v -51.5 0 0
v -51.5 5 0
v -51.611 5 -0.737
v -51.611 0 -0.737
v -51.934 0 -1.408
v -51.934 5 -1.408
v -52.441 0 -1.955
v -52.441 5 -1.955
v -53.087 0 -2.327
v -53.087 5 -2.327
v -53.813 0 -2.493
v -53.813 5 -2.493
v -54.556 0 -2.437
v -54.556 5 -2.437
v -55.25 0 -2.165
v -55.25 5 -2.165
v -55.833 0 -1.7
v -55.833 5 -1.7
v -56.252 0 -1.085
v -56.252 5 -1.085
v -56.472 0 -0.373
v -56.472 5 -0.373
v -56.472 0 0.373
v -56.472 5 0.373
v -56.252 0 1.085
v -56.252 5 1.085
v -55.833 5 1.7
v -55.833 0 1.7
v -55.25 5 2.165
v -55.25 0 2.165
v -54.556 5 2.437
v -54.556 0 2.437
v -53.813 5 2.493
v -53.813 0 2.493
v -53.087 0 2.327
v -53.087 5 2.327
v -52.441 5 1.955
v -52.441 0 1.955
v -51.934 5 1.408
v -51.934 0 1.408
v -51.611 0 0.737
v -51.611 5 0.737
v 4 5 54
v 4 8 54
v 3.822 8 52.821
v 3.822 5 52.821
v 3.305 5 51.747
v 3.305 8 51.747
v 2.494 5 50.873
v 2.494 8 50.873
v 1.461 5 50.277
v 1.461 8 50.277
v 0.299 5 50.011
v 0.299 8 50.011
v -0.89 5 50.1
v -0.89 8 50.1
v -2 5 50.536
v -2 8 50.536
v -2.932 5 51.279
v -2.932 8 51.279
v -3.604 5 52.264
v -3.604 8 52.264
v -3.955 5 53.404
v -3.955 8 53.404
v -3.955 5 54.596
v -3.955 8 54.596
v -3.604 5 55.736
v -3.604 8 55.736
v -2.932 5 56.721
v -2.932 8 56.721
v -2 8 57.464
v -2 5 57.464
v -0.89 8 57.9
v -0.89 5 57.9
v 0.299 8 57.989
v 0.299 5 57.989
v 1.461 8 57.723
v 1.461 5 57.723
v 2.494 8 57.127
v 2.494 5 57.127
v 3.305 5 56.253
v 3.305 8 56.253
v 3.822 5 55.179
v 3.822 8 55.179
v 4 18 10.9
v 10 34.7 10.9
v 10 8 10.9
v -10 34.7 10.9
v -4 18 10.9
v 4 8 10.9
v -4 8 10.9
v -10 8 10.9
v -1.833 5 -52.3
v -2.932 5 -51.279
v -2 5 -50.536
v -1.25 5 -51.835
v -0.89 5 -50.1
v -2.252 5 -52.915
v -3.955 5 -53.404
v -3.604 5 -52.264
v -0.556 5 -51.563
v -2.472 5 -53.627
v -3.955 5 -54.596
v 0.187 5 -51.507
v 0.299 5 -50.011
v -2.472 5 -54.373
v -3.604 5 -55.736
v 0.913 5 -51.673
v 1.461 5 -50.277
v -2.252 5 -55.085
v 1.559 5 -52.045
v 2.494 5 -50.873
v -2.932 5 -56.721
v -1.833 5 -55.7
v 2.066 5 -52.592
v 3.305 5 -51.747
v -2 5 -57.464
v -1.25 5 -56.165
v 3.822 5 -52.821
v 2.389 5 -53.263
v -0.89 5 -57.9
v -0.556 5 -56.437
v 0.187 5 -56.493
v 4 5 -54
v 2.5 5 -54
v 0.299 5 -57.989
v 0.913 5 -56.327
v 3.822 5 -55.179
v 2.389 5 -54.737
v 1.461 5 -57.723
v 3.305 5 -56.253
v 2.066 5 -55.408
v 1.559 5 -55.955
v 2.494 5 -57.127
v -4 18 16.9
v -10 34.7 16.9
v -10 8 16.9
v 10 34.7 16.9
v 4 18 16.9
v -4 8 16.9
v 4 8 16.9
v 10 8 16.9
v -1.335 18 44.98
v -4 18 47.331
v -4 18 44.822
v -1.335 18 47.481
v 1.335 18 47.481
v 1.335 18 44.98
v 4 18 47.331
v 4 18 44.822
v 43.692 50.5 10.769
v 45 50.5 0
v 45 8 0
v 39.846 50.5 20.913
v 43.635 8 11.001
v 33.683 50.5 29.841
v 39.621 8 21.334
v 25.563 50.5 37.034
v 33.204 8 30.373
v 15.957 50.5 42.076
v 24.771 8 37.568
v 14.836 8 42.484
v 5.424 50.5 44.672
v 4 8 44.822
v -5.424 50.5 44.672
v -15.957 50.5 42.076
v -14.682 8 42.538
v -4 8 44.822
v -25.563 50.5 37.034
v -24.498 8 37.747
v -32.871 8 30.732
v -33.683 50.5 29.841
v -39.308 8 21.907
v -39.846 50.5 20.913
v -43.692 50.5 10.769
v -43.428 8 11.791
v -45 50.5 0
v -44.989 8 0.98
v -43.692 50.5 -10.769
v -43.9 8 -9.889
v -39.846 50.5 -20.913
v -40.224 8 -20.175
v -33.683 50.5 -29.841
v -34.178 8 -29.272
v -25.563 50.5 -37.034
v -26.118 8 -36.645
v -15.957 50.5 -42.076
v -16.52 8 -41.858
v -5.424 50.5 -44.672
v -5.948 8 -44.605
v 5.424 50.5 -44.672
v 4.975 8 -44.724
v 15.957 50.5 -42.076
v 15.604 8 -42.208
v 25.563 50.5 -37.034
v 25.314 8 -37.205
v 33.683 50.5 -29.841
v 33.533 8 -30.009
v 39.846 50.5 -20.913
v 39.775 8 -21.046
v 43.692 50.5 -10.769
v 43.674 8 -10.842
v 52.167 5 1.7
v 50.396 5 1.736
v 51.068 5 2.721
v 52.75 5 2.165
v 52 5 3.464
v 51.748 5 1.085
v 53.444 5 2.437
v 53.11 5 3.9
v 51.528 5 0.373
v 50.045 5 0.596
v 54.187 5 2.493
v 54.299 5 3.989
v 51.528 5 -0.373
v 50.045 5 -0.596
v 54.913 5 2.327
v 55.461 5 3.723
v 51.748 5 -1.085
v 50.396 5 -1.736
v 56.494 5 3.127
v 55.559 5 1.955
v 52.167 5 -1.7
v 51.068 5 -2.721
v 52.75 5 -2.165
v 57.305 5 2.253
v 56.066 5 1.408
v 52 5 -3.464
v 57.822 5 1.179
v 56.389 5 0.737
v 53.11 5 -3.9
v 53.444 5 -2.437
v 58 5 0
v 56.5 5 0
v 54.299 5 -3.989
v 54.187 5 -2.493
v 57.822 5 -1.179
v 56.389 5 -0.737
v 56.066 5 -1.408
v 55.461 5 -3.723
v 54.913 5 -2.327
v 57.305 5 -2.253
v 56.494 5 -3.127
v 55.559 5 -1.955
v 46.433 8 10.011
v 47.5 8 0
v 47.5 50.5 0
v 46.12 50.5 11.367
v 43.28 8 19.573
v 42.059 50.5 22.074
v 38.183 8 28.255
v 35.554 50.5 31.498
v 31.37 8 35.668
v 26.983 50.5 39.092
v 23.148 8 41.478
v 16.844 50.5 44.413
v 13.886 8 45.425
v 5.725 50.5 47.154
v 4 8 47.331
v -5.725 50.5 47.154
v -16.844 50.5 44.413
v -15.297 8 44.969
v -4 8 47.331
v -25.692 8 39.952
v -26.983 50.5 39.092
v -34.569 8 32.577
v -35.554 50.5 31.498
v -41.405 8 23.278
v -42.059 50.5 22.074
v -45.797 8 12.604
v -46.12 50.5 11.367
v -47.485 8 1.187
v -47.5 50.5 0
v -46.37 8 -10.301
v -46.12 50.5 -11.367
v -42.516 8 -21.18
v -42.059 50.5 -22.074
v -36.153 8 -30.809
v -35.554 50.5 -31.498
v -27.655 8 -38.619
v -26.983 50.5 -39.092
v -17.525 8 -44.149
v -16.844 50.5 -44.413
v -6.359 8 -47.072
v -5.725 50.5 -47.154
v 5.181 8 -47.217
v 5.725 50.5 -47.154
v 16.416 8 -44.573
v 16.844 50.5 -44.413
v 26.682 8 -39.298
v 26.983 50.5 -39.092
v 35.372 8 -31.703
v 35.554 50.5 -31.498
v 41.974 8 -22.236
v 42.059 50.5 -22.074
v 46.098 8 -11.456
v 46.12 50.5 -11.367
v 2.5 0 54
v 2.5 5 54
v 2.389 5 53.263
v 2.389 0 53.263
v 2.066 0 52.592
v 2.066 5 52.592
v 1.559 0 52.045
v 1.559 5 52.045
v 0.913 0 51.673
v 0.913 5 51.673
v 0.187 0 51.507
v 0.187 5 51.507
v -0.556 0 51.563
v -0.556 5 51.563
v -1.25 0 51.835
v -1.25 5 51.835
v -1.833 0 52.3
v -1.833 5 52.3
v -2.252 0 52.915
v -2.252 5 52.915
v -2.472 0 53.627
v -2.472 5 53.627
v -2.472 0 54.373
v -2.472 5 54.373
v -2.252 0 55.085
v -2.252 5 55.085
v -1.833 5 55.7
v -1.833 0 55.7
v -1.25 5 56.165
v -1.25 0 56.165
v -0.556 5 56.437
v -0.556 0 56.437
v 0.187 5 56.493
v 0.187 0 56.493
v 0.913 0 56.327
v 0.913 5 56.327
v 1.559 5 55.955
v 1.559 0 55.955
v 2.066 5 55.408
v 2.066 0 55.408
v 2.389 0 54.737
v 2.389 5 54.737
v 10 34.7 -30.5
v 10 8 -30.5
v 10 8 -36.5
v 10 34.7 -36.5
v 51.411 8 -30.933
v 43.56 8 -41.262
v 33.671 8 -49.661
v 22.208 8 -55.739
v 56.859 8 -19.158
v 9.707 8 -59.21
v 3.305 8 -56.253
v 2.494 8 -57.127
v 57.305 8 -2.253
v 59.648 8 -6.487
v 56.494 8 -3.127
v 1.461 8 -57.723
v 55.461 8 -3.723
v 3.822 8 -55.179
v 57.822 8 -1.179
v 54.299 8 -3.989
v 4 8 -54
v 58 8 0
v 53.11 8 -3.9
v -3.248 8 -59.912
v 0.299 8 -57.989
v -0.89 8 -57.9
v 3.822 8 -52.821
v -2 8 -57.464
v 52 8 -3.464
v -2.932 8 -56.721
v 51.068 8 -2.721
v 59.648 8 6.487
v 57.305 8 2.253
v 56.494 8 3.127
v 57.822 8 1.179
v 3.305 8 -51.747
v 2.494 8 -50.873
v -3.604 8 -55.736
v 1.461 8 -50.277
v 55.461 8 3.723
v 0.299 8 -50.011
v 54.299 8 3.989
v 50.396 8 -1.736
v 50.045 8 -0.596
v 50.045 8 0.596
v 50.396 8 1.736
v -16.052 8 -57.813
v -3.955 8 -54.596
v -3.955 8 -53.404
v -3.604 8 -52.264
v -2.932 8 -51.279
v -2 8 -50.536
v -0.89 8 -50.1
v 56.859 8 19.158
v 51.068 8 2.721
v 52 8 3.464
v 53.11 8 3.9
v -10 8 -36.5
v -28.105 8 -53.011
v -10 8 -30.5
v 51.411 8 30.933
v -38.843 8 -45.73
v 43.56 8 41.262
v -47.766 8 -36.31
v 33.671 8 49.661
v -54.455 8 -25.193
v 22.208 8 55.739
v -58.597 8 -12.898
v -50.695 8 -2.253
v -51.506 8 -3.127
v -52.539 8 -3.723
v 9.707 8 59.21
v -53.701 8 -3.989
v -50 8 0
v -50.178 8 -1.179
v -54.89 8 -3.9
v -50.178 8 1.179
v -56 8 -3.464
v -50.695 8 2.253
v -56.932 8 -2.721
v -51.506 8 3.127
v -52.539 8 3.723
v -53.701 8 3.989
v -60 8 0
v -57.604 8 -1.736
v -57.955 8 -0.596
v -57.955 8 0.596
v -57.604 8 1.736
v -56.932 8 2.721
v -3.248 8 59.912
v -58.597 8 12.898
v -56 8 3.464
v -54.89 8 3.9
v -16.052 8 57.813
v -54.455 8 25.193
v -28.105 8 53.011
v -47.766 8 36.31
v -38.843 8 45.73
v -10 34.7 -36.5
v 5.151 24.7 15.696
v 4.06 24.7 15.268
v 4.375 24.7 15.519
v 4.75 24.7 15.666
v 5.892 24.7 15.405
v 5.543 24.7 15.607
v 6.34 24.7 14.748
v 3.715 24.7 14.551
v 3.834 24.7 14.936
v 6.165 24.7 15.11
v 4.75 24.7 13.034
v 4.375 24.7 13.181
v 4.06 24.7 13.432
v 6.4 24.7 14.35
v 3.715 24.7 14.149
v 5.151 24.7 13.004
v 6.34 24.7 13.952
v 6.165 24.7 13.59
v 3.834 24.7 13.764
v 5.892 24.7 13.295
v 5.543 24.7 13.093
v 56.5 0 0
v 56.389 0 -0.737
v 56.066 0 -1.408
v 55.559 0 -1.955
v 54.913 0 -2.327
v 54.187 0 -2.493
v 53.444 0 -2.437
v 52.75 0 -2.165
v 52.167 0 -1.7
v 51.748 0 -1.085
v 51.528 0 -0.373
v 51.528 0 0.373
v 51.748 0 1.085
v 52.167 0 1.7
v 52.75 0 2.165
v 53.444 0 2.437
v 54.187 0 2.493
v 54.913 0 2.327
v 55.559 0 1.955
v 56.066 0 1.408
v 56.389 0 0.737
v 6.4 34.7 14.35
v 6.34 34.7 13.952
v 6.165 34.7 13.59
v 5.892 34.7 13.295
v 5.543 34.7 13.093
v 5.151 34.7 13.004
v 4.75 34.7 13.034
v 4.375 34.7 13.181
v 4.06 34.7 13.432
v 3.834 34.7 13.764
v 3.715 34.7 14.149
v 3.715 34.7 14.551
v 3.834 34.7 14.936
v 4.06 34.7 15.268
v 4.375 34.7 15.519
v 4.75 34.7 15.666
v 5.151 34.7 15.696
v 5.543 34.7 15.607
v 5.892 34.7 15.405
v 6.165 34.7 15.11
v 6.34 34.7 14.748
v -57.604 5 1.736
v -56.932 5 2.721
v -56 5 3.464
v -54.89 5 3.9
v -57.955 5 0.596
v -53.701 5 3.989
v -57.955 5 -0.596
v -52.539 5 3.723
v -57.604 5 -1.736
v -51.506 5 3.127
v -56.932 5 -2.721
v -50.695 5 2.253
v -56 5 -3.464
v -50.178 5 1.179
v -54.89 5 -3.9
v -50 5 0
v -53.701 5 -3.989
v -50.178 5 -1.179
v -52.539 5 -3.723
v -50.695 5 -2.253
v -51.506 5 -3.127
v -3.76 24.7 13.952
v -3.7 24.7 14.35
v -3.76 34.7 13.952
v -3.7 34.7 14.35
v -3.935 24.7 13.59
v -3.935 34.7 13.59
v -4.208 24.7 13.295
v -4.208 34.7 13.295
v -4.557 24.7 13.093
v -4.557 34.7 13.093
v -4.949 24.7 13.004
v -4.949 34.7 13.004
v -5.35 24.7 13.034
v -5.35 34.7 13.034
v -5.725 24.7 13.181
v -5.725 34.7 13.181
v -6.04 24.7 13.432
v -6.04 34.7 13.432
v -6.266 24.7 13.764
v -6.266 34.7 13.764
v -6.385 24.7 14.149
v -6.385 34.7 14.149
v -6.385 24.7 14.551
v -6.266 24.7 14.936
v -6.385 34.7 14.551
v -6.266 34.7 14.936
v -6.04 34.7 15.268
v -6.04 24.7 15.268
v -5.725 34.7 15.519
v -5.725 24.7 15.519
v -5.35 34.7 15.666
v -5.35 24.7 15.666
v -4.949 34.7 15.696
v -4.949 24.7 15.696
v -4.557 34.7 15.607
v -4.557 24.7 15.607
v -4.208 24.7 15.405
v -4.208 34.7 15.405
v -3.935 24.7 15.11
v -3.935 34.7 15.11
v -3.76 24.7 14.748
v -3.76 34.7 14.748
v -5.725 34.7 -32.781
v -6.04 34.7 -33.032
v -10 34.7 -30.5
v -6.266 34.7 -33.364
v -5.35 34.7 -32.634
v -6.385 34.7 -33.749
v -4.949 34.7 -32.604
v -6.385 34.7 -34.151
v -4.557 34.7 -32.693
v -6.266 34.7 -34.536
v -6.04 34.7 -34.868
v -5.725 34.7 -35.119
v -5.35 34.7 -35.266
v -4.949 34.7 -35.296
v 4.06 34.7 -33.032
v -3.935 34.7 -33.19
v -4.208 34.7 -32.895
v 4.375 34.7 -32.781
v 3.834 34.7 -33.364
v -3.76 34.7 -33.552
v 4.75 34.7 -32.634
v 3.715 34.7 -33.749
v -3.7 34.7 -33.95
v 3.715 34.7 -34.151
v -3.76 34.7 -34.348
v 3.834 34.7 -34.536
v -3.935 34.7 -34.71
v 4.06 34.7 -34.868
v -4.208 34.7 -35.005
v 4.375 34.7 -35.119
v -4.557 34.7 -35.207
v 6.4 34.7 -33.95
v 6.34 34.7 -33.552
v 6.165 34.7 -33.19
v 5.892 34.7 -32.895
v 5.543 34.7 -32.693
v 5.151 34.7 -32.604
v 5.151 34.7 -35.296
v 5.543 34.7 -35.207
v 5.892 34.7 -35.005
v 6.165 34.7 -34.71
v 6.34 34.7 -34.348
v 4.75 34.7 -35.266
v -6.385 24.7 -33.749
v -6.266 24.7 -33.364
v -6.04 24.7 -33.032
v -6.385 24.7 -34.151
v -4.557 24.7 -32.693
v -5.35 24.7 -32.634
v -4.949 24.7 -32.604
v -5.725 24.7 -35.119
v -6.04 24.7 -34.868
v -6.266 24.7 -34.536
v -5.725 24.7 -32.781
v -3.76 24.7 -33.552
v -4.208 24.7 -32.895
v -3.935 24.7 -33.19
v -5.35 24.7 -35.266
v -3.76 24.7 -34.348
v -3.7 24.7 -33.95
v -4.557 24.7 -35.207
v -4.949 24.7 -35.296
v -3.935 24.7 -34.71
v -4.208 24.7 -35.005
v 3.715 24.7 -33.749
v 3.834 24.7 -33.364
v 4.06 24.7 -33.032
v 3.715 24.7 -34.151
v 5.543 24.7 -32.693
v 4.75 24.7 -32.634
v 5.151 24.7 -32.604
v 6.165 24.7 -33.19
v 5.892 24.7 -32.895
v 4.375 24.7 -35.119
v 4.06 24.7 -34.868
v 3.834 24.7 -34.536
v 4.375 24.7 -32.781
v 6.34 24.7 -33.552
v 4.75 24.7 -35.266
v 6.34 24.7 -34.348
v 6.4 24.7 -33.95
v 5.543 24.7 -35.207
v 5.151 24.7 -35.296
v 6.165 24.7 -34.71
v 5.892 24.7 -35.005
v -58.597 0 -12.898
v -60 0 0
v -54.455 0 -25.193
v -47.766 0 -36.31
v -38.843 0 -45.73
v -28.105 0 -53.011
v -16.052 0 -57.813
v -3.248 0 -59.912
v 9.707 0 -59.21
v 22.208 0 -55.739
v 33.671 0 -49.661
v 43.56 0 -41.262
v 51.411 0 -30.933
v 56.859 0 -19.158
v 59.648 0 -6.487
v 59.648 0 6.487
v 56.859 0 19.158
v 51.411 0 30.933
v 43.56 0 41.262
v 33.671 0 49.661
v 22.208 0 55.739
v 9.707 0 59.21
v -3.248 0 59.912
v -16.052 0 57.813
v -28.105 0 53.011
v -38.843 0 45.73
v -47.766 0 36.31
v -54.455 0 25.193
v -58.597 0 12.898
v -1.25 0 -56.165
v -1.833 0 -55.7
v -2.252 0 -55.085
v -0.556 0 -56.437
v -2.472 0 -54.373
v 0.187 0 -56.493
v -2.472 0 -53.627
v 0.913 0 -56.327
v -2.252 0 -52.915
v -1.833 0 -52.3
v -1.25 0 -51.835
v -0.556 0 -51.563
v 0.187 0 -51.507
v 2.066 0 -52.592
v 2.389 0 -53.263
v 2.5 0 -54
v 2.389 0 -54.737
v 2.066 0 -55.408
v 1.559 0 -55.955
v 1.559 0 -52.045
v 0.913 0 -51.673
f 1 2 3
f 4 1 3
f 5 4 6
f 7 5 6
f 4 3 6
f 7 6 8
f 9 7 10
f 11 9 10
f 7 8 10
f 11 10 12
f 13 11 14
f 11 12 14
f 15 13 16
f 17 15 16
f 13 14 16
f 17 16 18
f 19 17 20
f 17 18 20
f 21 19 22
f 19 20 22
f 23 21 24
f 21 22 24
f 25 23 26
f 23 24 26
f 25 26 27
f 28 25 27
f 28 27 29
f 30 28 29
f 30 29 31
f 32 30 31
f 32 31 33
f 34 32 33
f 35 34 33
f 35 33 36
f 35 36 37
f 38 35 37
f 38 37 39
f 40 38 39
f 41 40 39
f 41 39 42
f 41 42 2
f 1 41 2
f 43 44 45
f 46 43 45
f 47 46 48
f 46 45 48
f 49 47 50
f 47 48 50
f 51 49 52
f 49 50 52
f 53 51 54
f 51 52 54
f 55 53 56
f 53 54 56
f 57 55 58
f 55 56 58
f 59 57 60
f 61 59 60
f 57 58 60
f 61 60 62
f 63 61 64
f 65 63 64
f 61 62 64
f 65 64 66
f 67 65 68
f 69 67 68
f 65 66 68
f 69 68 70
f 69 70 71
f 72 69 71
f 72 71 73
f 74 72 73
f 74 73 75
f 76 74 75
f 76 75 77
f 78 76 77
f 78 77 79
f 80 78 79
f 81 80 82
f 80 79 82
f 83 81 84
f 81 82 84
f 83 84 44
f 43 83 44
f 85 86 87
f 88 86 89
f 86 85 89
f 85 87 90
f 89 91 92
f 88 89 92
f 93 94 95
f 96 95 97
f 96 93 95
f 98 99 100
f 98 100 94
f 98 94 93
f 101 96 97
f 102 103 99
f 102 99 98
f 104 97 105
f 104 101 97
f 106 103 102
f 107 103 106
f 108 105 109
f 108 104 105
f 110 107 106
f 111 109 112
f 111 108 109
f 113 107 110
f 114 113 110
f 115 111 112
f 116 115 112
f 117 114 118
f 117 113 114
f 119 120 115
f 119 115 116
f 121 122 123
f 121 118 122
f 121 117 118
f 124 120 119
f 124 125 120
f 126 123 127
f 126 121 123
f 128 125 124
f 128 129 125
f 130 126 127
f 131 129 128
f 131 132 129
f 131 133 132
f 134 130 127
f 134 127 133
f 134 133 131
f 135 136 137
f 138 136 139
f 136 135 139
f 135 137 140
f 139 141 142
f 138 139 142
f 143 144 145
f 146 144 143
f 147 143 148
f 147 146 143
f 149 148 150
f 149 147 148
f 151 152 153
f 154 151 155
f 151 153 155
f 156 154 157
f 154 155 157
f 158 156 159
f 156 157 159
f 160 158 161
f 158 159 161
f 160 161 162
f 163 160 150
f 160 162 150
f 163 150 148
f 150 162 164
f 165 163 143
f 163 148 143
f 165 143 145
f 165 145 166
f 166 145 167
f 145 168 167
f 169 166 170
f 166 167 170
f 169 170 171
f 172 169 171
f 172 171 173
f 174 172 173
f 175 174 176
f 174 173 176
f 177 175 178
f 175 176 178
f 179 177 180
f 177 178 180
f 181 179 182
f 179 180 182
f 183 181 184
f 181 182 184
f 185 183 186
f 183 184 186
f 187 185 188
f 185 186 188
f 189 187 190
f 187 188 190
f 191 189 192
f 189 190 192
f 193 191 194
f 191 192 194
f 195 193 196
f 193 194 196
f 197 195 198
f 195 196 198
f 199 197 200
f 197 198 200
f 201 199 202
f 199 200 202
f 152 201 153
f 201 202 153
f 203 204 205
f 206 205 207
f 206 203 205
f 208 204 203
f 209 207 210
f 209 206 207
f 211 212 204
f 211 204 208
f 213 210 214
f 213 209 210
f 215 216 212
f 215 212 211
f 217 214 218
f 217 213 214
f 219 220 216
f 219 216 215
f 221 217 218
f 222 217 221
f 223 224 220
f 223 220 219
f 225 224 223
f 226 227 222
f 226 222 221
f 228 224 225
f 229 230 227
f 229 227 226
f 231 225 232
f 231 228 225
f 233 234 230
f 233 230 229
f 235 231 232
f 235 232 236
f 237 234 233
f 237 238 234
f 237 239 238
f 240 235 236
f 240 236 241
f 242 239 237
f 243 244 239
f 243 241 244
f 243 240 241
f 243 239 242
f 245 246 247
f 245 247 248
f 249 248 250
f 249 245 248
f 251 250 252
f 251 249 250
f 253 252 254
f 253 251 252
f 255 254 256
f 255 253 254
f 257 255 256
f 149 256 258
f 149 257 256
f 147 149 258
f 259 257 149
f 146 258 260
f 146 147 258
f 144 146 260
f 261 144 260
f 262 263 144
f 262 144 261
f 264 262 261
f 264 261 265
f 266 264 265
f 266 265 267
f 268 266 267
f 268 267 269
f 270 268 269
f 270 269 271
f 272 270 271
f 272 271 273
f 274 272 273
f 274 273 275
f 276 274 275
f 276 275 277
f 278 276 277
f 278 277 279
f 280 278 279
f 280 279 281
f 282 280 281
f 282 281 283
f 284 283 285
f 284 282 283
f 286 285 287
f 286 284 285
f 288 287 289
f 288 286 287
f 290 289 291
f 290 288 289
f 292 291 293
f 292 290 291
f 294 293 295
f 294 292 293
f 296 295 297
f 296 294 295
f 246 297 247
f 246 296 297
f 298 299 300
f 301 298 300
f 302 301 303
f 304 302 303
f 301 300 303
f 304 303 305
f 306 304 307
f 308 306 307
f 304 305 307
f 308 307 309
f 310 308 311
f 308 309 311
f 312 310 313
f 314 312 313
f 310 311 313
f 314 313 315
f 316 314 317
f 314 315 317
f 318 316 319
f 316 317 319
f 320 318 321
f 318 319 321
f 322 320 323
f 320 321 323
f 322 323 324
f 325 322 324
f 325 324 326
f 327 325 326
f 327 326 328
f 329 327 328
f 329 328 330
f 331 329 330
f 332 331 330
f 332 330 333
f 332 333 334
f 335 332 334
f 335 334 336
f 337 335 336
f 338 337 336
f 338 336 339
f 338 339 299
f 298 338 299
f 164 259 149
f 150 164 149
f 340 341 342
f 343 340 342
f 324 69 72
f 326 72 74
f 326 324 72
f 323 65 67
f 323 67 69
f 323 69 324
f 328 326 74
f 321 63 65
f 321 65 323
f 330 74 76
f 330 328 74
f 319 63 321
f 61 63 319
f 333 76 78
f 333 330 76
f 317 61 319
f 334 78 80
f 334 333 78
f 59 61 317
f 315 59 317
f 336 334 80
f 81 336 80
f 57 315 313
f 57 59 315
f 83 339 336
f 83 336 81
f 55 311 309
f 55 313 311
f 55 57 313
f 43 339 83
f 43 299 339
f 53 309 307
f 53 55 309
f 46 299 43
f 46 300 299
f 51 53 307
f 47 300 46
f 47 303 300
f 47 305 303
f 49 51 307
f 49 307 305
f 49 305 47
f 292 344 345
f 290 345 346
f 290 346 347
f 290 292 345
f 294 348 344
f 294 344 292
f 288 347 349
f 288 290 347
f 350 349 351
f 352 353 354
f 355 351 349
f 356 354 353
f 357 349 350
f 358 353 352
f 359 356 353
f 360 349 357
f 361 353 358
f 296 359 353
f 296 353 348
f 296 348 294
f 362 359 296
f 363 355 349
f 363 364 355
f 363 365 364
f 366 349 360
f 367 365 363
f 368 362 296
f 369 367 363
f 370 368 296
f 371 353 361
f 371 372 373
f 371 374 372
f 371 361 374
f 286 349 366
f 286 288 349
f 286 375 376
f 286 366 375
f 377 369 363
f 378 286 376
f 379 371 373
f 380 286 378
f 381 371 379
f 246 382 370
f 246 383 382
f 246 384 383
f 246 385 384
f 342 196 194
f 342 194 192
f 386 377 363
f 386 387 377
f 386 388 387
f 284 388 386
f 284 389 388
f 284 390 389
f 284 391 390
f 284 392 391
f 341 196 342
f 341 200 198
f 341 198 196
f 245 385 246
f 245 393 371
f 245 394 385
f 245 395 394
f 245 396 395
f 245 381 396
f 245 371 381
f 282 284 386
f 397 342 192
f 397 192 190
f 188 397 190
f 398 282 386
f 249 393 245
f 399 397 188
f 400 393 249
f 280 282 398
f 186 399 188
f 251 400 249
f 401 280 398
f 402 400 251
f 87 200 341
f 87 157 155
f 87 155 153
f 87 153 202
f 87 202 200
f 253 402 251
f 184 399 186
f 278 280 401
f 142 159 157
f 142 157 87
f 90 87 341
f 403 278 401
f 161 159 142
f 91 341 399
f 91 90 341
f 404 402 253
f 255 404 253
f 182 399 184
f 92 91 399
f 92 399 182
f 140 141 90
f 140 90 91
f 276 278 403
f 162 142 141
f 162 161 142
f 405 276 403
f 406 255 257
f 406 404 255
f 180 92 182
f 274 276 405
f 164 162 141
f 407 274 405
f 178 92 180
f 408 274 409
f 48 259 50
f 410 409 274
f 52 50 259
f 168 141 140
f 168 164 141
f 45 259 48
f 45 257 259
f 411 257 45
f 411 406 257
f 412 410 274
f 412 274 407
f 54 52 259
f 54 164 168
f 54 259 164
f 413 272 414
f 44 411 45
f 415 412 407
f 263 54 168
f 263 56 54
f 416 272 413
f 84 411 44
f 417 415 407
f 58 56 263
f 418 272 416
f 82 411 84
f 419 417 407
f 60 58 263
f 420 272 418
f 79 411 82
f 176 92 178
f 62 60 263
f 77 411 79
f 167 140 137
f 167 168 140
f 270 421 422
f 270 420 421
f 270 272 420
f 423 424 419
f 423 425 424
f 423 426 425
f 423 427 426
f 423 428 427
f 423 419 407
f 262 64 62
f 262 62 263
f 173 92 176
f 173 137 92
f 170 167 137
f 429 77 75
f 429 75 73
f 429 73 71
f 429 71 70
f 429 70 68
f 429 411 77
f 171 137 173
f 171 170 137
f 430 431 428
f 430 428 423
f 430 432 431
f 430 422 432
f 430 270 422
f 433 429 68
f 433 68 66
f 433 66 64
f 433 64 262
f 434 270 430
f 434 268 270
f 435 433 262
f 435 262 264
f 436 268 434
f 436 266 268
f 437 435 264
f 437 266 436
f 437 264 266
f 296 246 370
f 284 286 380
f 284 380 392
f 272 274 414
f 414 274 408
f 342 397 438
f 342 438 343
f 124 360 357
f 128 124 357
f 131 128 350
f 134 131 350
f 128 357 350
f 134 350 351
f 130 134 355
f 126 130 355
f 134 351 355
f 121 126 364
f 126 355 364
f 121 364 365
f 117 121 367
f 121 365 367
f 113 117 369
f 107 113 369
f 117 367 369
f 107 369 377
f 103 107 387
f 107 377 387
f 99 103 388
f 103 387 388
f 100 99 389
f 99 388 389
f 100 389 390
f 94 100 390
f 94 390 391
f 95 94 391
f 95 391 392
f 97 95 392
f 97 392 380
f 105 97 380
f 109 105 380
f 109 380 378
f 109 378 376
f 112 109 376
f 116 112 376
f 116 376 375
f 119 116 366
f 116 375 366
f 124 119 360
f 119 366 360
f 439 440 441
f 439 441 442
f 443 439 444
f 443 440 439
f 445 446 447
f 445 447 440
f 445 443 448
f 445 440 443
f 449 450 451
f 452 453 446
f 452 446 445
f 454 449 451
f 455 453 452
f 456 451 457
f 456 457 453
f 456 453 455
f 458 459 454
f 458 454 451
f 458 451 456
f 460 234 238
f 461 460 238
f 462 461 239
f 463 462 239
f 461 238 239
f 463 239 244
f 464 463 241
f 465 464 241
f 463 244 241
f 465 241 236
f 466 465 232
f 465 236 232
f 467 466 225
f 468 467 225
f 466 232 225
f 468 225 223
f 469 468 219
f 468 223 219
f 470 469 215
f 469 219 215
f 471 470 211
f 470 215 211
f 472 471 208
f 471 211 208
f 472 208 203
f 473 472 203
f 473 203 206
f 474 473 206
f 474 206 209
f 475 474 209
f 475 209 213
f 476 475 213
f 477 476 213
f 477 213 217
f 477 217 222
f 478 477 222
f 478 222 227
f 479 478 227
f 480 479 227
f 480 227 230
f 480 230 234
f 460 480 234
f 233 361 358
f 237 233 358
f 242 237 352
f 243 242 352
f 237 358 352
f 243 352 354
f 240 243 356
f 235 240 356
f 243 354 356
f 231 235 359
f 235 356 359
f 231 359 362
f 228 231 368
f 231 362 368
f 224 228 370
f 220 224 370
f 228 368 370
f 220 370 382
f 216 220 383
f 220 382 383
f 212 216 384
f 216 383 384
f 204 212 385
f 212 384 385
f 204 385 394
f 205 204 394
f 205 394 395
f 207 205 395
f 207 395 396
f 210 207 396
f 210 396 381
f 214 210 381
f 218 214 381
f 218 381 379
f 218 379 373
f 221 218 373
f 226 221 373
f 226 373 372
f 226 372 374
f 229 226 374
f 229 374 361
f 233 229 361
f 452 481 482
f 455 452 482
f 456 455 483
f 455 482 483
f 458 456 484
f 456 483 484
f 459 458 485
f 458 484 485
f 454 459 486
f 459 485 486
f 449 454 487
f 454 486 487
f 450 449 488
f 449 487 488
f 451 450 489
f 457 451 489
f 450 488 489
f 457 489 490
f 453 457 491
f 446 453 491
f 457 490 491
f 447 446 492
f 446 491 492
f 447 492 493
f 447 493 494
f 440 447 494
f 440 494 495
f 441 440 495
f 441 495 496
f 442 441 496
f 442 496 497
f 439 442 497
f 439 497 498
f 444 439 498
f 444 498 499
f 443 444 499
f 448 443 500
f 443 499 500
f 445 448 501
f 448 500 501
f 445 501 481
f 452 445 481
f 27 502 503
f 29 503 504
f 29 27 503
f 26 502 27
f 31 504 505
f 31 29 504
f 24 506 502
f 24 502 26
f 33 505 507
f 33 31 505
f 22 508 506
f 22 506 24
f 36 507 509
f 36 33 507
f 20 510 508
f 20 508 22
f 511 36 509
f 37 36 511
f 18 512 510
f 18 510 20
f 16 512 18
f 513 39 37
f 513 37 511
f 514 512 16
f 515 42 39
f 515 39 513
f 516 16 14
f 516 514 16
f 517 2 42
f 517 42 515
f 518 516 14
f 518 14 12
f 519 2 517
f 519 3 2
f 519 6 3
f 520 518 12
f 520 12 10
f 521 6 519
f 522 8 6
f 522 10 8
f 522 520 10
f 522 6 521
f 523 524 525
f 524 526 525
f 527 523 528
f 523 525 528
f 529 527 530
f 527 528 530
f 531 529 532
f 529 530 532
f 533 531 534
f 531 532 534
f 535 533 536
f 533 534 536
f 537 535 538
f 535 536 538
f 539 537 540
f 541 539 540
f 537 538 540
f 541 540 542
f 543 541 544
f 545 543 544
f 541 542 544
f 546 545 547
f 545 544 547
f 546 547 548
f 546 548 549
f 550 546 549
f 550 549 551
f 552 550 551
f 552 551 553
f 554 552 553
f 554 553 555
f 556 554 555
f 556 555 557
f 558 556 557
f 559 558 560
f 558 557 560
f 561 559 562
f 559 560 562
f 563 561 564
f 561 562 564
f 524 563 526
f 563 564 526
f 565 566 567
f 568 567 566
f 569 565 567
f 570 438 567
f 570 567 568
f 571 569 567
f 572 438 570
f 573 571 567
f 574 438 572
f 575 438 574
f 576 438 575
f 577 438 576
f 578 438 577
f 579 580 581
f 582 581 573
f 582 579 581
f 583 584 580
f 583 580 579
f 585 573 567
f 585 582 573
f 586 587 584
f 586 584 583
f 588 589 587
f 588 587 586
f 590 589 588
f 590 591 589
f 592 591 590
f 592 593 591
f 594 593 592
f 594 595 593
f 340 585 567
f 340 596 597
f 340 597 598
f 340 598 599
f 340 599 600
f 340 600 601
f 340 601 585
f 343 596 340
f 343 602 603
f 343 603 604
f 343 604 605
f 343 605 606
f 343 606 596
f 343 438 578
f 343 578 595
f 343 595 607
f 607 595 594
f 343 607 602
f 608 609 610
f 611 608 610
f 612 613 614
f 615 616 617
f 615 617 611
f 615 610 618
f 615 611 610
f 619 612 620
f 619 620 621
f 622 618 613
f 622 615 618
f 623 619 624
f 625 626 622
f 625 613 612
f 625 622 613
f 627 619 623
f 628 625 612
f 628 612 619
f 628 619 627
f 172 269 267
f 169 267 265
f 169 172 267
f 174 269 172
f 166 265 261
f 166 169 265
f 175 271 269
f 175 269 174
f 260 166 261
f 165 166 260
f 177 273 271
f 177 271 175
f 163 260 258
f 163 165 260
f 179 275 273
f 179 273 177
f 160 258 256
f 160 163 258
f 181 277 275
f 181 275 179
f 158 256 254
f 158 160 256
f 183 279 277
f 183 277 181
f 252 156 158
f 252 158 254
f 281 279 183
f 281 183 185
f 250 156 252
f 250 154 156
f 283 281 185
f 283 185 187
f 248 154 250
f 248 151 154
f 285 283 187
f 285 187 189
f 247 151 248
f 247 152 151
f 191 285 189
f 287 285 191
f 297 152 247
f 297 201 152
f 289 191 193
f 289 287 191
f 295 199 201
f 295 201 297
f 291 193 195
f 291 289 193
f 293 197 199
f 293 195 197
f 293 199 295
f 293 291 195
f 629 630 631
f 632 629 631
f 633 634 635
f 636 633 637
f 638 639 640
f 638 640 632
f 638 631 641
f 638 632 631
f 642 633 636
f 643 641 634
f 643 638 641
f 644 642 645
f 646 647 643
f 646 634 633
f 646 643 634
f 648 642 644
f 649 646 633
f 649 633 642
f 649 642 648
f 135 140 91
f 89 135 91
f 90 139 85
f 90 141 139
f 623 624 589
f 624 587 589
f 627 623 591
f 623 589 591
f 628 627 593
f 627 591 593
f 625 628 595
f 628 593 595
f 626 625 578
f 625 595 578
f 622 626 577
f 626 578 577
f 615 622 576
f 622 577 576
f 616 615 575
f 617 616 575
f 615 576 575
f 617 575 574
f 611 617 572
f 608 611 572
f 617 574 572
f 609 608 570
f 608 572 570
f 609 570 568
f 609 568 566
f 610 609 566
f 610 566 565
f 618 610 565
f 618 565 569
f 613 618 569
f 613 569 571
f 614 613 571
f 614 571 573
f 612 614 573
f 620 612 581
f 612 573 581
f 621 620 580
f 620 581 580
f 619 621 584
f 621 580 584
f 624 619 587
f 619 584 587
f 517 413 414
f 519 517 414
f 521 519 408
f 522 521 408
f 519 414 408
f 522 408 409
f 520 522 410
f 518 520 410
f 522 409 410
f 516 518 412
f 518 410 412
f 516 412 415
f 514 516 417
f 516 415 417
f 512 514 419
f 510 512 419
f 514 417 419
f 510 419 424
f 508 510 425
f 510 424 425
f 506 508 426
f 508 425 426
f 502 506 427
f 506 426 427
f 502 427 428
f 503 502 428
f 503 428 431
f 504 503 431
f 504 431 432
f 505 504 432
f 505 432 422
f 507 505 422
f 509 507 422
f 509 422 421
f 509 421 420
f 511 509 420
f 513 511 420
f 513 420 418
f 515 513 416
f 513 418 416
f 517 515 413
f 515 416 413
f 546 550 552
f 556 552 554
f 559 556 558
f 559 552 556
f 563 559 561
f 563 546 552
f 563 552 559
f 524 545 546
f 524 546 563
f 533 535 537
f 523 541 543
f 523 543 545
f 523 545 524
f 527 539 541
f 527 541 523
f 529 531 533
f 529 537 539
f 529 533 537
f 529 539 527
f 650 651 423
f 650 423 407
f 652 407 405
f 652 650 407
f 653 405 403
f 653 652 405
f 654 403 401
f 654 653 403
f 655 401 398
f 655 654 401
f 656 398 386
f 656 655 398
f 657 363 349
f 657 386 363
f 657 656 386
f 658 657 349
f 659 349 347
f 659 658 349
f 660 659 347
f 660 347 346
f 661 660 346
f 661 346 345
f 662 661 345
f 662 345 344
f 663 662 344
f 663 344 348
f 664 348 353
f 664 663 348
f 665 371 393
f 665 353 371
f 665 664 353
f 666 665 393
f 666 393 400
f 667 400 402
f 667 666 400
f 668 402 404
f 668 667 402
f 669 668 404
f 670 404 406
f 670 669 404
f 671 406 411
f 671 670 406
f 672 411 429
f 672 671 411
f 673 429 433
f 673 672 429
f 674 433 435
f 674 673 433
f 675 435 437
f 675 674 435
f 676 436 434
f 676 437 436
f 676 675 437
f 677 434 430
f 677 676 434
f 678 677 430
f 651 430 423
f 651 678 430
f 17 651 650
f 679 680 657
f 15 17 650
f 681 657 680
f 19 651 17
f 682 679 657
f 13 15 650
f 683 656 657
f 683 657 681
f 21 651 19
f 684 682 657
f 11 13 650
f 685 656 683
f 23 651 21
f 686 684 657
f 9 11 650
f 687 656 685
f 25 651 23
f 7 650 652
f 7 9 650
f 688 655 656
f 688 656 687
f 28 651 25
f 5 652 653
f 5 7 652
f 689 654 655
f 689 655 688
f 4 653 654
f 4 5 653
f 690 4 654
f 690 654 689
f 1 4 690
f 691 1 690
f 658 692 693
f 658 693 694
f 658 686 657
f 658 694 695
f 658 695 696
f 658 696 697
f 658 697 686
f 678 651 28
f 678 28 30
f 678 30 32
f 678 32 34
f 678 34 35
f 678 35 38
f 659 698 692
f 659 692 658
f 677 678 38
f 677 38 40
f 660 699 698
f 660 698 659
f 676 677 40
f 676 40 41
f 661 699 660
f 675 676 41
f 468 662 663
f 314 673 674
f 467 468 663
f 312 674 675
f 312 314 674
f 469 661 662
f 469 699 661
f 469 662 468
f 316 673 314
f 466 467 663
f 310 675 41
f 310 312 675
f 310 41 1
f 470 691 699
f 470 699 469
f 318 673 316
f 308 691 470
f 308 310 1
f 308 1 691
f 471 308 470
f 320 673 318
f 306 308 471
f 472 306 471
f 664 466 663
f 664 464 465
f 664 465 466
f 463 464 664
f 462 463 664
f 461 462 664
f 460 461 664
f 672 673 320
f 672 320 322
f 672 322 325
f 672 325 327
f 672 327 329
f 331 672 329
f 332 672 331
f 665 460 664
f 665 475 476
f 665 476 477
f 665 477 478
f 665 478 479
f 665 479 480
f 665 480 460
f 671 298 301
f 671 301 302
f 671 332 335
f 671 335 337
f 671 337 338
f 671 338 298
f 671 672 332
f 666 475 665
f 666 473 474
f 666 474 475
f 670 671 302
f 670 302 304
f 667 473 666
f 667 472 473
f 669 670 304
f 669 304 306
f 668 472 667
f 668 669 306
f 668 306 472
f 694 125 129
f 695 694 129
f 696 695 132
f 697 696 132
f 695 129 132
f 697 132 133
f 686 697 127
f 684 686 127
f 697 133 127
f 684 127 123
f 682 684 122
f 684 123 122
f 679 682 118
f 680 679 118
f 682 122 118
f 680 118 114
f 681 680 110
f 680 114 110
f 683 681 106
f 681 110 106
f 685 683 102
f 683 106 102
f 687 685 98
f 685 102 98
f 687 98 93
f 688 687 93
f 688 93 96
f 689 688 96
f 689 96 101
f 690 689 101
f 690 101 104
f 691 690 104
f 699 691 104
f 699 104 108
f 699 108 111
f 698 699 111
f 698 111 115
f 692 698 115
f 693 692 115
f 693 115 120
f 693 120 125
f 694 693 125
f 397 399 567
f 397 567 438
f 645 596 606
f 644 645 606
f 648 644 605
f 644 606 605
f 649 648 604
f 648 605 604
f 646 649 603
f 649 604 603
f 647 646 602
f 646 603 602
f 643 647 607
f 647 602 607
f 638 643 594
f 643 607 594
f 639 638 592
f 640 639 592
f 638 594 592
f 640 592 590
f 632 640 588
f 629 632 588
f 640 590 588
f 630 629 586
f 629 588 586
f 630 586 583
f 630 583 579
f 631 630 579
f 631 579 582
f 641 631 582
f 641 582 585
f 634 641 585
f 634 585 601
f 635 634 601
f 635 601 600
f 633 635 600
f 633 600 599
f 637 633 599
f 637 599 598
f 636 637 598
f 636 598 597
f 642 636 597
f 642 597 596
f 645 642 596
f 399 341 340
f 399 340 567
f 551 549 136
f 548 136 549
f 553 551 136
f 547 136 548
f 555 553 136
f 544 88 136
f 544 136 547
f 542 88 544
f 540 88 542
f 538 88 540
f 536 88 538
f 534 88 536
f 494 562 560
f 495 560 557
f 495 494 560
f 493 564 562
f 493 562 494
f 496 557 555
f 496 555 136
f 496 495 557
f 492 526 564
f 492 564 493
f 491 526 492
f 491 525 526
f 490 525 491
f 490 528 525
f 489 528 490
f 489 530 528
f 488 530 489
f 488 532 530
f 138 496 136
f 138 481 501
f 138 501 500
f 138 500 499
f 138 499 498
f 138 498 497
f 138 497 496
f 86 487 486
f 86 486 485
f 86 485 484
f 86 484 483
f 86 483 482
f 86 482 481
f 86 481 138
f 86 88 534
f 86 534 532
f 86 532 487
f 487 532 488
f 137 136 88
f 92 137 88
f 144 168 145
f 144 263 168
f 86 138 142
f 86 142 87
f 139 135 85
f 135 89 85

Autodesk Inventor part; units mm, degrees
ref_plane "YZ Plane" through (0, 0, 0) normal (1, 0, 0) x (0, 1, 0)
ref_plane "XZ Plane" through (0, 0, 0) normal (0, 1, 0) x (-1, 0, 0)
ref_plane "XY Plane" through (0, 0, 0) normal (0, 0, 1) x (1, 0, 0)
sketch "Sketch1" plane through (0, 0, 0) normal (0, 1, 0) x (-1, 0, 0)
  circle A0 centre (0, 0) radius 60
  dimension "d0" = 120
extrude "Extrusion1" add sketch "Sketch1" along normal blind 8
sketch "Sketch2" plane through (0, 8, 0) normal (0, 1, 0) x (1, 0, 0)
  circle A0 centre (-54, 0) radius 4
  circle A1 centre (-54, 0) radius 2.5
  circle A2 centre (0, -54) radius 4
  circle A3 centre (0, -54) radius 2.5
  circle A4 centre (54, 0) radius 4
  circle A5 centre (54, 0) radius 2.5
  circle A6 centre (0, 54) radius 4
  circle A7 centre (0, 54) radius 2.5
  point P0 (0, 0)
  dimension "d3" = 8
  dimension "d4" = 5
  dimension "d5" = 8
  dimension "d6" = 5
  dimension "d7" = 8
  dimension "d8" = 5
  dimension "d9" = 8
  dimension "d10" = 5
extrude "Extrusion2" cut sketch "Sketch2" against normal blind 8 contours A1 | A3 | A5 | A7
sketch "Sketch3" plane through (0, 8, 0) normal (0, 1, 0) x (1, 0, 0)
  circle A0 centre (-54, 0) radius 2.5 projected
  circle A1 centre (-54, 0) radius 4
  circle A2 centre (-54, 0) radius 2.5
  circle A3 centre (0, 54) radius 2.5 projected
  circle A4 centre (0, 54) radius 4
  circle A5 centre (0, 54) radius 2.5
  circle A6 centre (54, 0) radius 2.5 projected
  circle A7 centre (54, 0) radius 4
  circle A8 centre (54, 0) radius 2.5
  circle A9 centre (0, -54) radius 4
  circle A10 centre (0, -54) radius 2.5
  point P0 (0, 0)
  dimension "d13" = 8
  dimension "d14" = 8
  dimension "d15" = 5
  dimension "d16" = 8
  dimension "d17" = 5
  dimension "d18" = 8
extrude "Extrusion3" cut sketch "Sketch3" against normal blind 3
sketch "Sketch4" plane through (0, 8, 0) normal (0, 1, 0) x (1, 0, 0)
  circle A0 centre (0, 0) radius 47.5
  circle A1 centre (0, 0) radius 45
  line L0 (0, 0) -> (-10, 0)
  line L1 (-10, 0) -> (-10, -9)
  line L2 (-10, -9) -> (0, -9)
  line L3 (0, -9) -> (0, 0)
  line L4 (0, -9) -> (10, -9)
  line L5 (10, -9) -> (10, 0)
  line L6 (10, 0) -> (0, 0)
  line L7 (0, 0) -> (0, -9)
  line L8 (-10, -9) -> (10, -9)
  line L9 (10, -9) -> (10, -16)
  line L10 (10, -16) -> (-10, -16)
  line L11 (-10, -16) -> (-10, -9)
  dimension "d21" = 95
  dimension "d22" = 90
  dimension "d23" = 10
  dimension "d24" = 9
  dimension "d25" = 10
  dimension "d26" = 7
extrude "Extrusion4" add sketch "Sketch4" along normal blind 10 contours A0
sketch "Sketch5" plane through (0, 8, 0) normal (0, 1, 0) x (1, 0, 0)
  line L0 (0, 0) -> (-10, 0)
  line L1 (-10, 0) -> (-10, -9)
  line L2 (-10, -9) -> (0, -9)
  line L3 (0, -9) -> (0, 0)
  line L4 (-10, -9) -> (10, -9)
  line L5 (10, -9) -> (10, -16)
  line L6 (10, -16) -> (-10, -16)
  line L7 (-10, -16) -> (-10, -9)
  line L8 (-10, -9) -> (10, -9)
  line L9 (10, -9) -> (10, 31)
  line L10 (10, 31) -> (-10, 31)
  line L11 (-10, 31) -> (-10, -9)
  line L12 (-10, 31) -> (-2, 31)
  line L13 (-2, 31) -> (-2, 38.36)
  line L14 (-2, 38.36) -> (-10, 38.36)
  line L15 (-10, 38.36) -> (-10, 31)
  line L16 (-10, 31) -> (10, 31)
  line L17 (10, 31) -> (10, 39)
  line L18 (10, 39) -> (-10, 39)
  line L19 (-10, 39) -> (-10, 31)
  line L20 (-10, -9) -> (10, -9)
  line L21 (10, -9) -> (10, -17)
  line L22 (10, -17) -> (-10, -17)
  line L23 (-10, -17) -> (-10, -9)
  dimension "d29" = 10
  dimension "d30" = 9
  dimension "d31" = 20
  dimension "d32" = 7
  dimension "d33" = 40
  dimension "d34" = 8
  dimension "d35" = 8
  dimension "d36" = 8
extrude "Extrusion5" add sketch "Sketch5" along normal blind 28 contours L4 L5 L6 L7 L2 | L15 L14 L13 L10 | L6 L21 L22 L23 | L13 L14 L19 L18 L17 L10
sketch "Sketch6" plane through (0, 36, 0) normal (0, 1, 0) x (1, 0, 0)
  line L0 (10, -17) -> (-10, -17) projected
  line L1 (-10, -9) -> (10, -9) projected
  line L2 (0, -17) -> (-4, -17)
  line L3 (-4, -17) -> (-4, -9)
  line L4 (-4, -9) -> (0, -9)
  line L5 (0, -9) -> (0, -17)
  line L6 (0, -17) -> (4, -17)
  line L7 (4, -17) -> (4, -9)
  line L8 (4, -9) -> (0, -9)
  line L9 (0, -9) -> (0, -17)
  point P0 (0, 0)
  dimension "d39" = 4
  dimension "d40" = 4
extrude "Extrusion6" cut sketch "Sketch6" against normal blind 28
sketch "Sketch7" plane through (0, 36, 0) normal (0, 1, 0) x (1, 0, 0)
  line L0 (-10, -17) -> (-4, -17) projected
  line L1 (4, -9) -> (10, -9) projected
  line L2 (-4, -17) -> (4, -17)
  line L3 (4, -17) -> (4, -9)
  line L4 (4, -9) -> (-4, -9)
  line L5 (-4, -9) -> (-4, -17)
  point P0 (0, 0)
extrude "Extrusion7" add sketch "Sketch7" against normal blind 22
sketch "Sketch8" plane through (0, 36, 0) normal (0, 1, 0) x (1, 0, 0)
  line L0 (-4, -17) -> (-10, -17) projected
  line L1 (10, -17) -> (10, -9) projected
  line L2 (-10, -17) -> (10, -17)
  line L3 (10, -17) -> (10, -15)
  line L4 (10, -15) -> (-10, -15)
  line L5 (-10, -15) -> (-10, -17)
  line L6 (-4, -9) -> (4, -9) projected
  line L7 (0, -9) -> (-5, -9)
  line L8 (-5, -9) -> (-5, -17)
  line L9 (-5, -17) -> (0, -17)
  line L10 (0, -17) -> (0, -9)
  line L11 (-10, -17) -> (10, -17) projected
  line L12 (0, -9) -> (5, -9)
  line L13 (5, -9) -> (5, -17)
  line L14 (5, -17) -> (0, -17)
  line L15 (0, -17) -> (0, -9)
  circle A0 centre (-5, -15) radius 2
  circle A1 centre (5, -15) radius 2
  line L16 (-10, 31) -> (-10, 39) projected
  line L17 (10, 39) -> (10, 31) projected
  line L18 (-10, 39) -> (10, 39)
  line L19 (10, 39) -> (10, 37)
  line L20 (10, 37) -> (-10, 37)
  line L21 (-10, 37) -> (-10, 39)
  line L22 (10, 31) -> (-10, 31) projected
  line L23 (-10, 39) -> (10, 39) projected
  line L24 (0, 31) -> (-5, 31)
  line L25 (-5, 31) -> (-5, 39)
  line L26 (-5, 39) -> (0, 39)
  line L27 (0, 39) -> (0, 31)
  line L28 (0, 31) -> (5, 31)
  line L29 (5, 31) -> (5, 39)
  line L30 (5, 39) -> (0, 39)
  line L31 (0, 39) -> (0, 31)
  circle A2 centre (-5, 37) radius 2
  circle A3 centre (5, 37) radius 2
  point P0 (0, 0)
  dimension "d45" = 2
  dimension "d46" = 5
  dimension "d47" = 5
  dimension "d48" = 4
  dimension "d49" = 4
  dimension "d50" = 2
  dimension "d51" = 4
  dimension "d52" = 4
extrude "Extrusion8" cut sketch "Sketch8" against normal blind 10 contours A0 L4 L8 | L8 L4 A0 | L8 A0 L4 | L4 A0 L8 | A1 L4 L13 | L13 L4 A1 | L13 A1 L4 | L4 A1 L13 | A2 L25 L20 | L20 L25 A2 | L25 L20 A2 | A2 L20 L25 | A3 L20 L29 | L29 L20 A3 | A3 L29 L20 | A3 L20 L29
sketch "Sketch9" plane through (0, 36, 0) normal (0, 1, 0) x (1, 0, 0)
  line L0 (-10, -17) -> (-5, -17) projected
  line L1 (10, -9) -> (-10, -9) projected
  line L2 (-10, -17) -> (10, -17)
  line L3 (10, -17) -> (10, -9)
  line L4 (10, -9) -> (-10, -9)
  line L5 (-10, -9) -> (-10, -17)
  line L6 (10, 31) -> (10, 39) projected
  line L7 (-10, 31) -> (10, 31)
  line L8 (10, 31) -> (10, 39)
  line L9 (10, 39) -> (-10, 39)
  line L10 (-10, 39) -> (-10, 31)
  point P0 (0, 0)
extrude "Extrusion9" cut sketch "Sketch9" against normal blind 28
sketch "Sketch10" plane through (0, 8, 0) normal (0, 1, 0) x (1, 0, 0)
  line L0 (0, 0) -> (-10, 0)
  line L1 (-10, 0) -> (-10, 36.5)
  line L2 (-10, 36.5) -> (0, 36.5)
  line L3 (0, 36.5) -> (0, 0)
  line L4 (-10, 0) -> (0, 0)
  line L5 (0, 0) -> (0, -16.9)
  line L6 (0, -16.9) -> (-10, -16.9)
  line L7 (-10, -16.9) -> (-10, 0)
  line L8 (0, -16.9) -> (10, -16.9)
  line L9 (10, -16.9) -> (10, 36.5)
  line L10 (10, 36.5) -> (0, 36.5)
  line L11 (0, 36.5) -> (0, -16.9)
  line L12 (-10, -16.9) -> (10, -16.9)
  line L13 (10, -16.9) -> (10, -10.9)
  line L14 (10, -10.9) -> (-10, -10.9)
  line L15 (-10, -10.9) -> (-10, -16.9)
  line L16 (-10, 36.5) -> (10, 36.5)
  line L17 (10, 36.5) -> (10, 30.5)
  line L18 (10, 30.5) -> (-10, 30.5)
  line L19 (-10, 30.5) -> (-10, 36.5)
  line L20 (-10, -16.9) -> (-4, -16.9)
  line L21 (-4, -16.9) -> (-4, -10.9)
  line L22 (-4, -10.9) -> (-10, -10.9)
  line L23 (-10, -10.9) -> (-10, -16.9)
  line L24 (10, -16.9) -> (4, -16.9)
  line L25 (4, -16.9) -> (4, -10.9)
  line L26 (4, -10.9) -> (10, -10.9)
  line L27 (10, -10.9) -> (10, -16.9)
  dimension "d57" = 10
  dimension "d58" = 36.5
  dimension "d59" = 16.9
  dimension "d60" = 10
  dimension "d61" = 6
  dimension "d62" = 6
  dimension "d63" = 6
  dimension "d64" = 6
extrude "Extrusion10" add sketch "Sketch10" along normal blind 10 contours L18 L1 L2 L3 | L3 L10 L9 L18 | L14 L21 L6 L7 | L14 L9 L8 L25
sketch "Sketch11" plane through (0, 18, 0) normal (0, 1, 0) x (1, 0, 0)
  line L0 (-10, 30.5) -> (10, 30.5) projected
  line L1 (10, 36.5) -> (-10, 36.5) projected
  line L2 (-10, 30.5) -> (10, 30.5)
  line L3 (10, 30.5) -> (10, 36.5)
  line L4 (10, 36.5) -> (-10, 36.5)
  line L5 (-10, 36.5) -> (-10, 30.5)
  line L6 (-10, -16.9) -> (-4, -16.9) projected
  line L7 (10, -10.9) -> (4, -10.9) projected
  line L8 (-10, -16.9) -> (10, -16.9)
  line L9 (10, -16.9) -> (10, -10.9)
  line L10 (10, -10.9) -> (-10, -10.9)
  line L11 (-10, -10.9) -> (-10, -16.9)
  point P0 (0, 0)
extrude "Extrusion11" add sketch "Sketch11" along normal blind 16.7
sketch "Sketch12" plane through (0, 34.7, 0) normal (0, 1, 0) x (1, 0, 0)
  line L0 (10, -16.9) -> (10, -10.9) projected
  line L1 (-10, -16.9) -> (10, -16.9)
  line L2 (10, -16.9) -> (10, -14.35)
  line L3 (10, -14.35) -> (-10, -14.35)
  line L4 (-10, -14.35) -> (-10, -16.9)
  line L5 (10, 30.5) -> (10, 36.5) projected
  line L6 (-10, 36.5) -> (10, 36.5)
  line L7 (10, 36.5) -> (10, 33.95)
  line L8 (10, 33.95) -> (-10, 33.95)
  line L9 (-10, 33.95) -> (-10, 36.5)
  line L10 (0, -16.9) -> (5.05, -16.9)
  line L11 (5.05, -16.9) -> (5.05, -14.35)
  line L12 (5.05, -14.35) -> (0, -14.35)
  line L13 (0, -14.35) -> (0, -16.9)
  line L14 (0, -16.9) -> (-5.05, -16.9)
  line L15 (-5.05, -16.9) -> (-5.05, -14.35)
  line L16 (-5.05, -14.35) -> (0, -14.35)
  line L17 (0, -14.35) -> (0, -16.9)
  line L18 (10, 36.5) -> (-10, 36.5) projected
  line L19 (0, 36.5) -> (-5.05, 36.5)
  line L20 (-5.05, 36.5) -> (-5.05, 33.95)
  line L21 (-5.05, 33.95) -> (0, 33.95)
  line L22 (0, 33.95) -> (0, 36.5)
  line L23 (0, 36.5) -> (5.05, 36.5)
  line L24 (5.05, 36.5) -> (5.05, 33.95)
  line L25 (5.05, 33.95) -> (0, 33.95)
  line L26 (0, 33.95) -> (0, 36.5)
  circle A0 centre (-5.05, -14.35) radius 1.35
  circle A1 centre (5.05, -14.35) radius 1.35
  circle A2 centre (-5.05, 33.95) radius 1.35
  circle A3 centre (5.05, 33.95) radius 1.35
  point P0 (0, 0)
  dimension "d69" = 2.55
  dimension "d70" = 2.55
  dimension "d71" = 5.05
  dimension "d72" = 5.05
  dimension "d73" = 5.05
  dimension "d74" = 5.05
  dimension "d75" = 2.7
  dimension "d76" = 2.7
  dimension "d77" = 2.7
  dimension "d78" = 2.7
extrude "Extrusion12" cut sketch "Sketch12" against normal blind 10 contours A1 L11 L3 | L3 A1 | A1 L3 L11 | A0 L3 L15 | L15 L3 A0 | L3 A0 | A3 L8 | L8 L24 A3 | L8 A3 L24 | A2 L8 | L8 L20 A2 | L20 L8 A2
thread "Thread1" size "M3x0.5" class "6H" standard "ANSI Metric M Profile" full length
thread "Thread2" size "M3x0.5" class "6H" standard "ANSI Metric M Profile" full length
thread "Thread3" size "M3x0.5" class "6H" standard "ANSI Metric M Profile" full length
thread "Thread4" size "M3x0.5" class "6H" standard "ANSI Metric M Profile" full length
sketch "Sketch13" plane through (0, 18, 0) normal (0, 1, 0) x (1, 0, 0)
  circle A0 centre (0, 0) radius 45
  circle A1 centre (0, 0) radius 47.5
extrude "Extrusion13" cut sketch "Sketch13" against normal blind 47.3
sketch "Sketch14" plane through (0, 8, 0) normal (0, 1, 0) x (1, 0, 0)
  circle A0 centre (0, 0) radius 45
  circle A1 centre (0, 0) radius 47.5
extrude "Extrusion14" add sketch "Sketch14" along normal blind 42.5
sketch "Sketch16" plane through (0, 50.5, 0) normal (0, 1, 0) x (1, 0, 0)
  circle A0 centre (0, 0) radius 45
  circle A1 centre (0, 0) radius 47.5
extrude "Extrusion15" cut sketch "Sketch16" against normal blind 42.5
sketch "Sketch17" plane through (0, 0, 0) normal (0, -1, 0) x (1, 0, 0)
  circle A0 centre (0, 0) radius 47.5
  circle A1 centre (0, 0) radius 45
extrude "Extrusion16" add sketch "Sketch17" against normal blind 8
sketch "Sketch18" plane through (0, 8, 0) normal (0, 1, 0) x (1, 0, 0)
  circle A0 centre (0, 0) radius 47.5
  circle A1 centre (0, 0) radius 45
  dimension "d97" = 95
  dimension "d98" = 90
extrude "Extrusion17" add sketch "Sketch18" along normal blind 42.5
sketch "Sketch19" plane through (4, 8, 16.9) normal (0, 0, 1) x (1, 0, 0)
  line L0 (-8, 0) -> (-8, 10) projected
  line L1 (-8, 0) -> (0, 0)
  line L2 (0, 0) -> (0, 10)
  line L3 (0, 10) -> (-8, 10)
  line L4 (-8, 10) -> (-8, 0)
  point P0 (-4, -8)
extrude "Extrusion18" add sketch "Sketch19" along normal blind 51.275
sketch "Sketch20" plane through (4, 8, 68.175) normal (0, 0, 1) x (1, 0, 0)
  line L0 (0, 0) -> (0, 10) projected
  line L1 (-8, 10) -> (0, 10)
  line L2 (0, 10) -> (0, 0)
  line L3 (0, 0) -> (-8, 0)
  line L4 (-8, 0) -> (-8, 10)
  point P0 (-4, -8)
extrude "Extrusion19" cut sketch "Sketch20" against normal blind 82.075
properties part number "NBase Part"
